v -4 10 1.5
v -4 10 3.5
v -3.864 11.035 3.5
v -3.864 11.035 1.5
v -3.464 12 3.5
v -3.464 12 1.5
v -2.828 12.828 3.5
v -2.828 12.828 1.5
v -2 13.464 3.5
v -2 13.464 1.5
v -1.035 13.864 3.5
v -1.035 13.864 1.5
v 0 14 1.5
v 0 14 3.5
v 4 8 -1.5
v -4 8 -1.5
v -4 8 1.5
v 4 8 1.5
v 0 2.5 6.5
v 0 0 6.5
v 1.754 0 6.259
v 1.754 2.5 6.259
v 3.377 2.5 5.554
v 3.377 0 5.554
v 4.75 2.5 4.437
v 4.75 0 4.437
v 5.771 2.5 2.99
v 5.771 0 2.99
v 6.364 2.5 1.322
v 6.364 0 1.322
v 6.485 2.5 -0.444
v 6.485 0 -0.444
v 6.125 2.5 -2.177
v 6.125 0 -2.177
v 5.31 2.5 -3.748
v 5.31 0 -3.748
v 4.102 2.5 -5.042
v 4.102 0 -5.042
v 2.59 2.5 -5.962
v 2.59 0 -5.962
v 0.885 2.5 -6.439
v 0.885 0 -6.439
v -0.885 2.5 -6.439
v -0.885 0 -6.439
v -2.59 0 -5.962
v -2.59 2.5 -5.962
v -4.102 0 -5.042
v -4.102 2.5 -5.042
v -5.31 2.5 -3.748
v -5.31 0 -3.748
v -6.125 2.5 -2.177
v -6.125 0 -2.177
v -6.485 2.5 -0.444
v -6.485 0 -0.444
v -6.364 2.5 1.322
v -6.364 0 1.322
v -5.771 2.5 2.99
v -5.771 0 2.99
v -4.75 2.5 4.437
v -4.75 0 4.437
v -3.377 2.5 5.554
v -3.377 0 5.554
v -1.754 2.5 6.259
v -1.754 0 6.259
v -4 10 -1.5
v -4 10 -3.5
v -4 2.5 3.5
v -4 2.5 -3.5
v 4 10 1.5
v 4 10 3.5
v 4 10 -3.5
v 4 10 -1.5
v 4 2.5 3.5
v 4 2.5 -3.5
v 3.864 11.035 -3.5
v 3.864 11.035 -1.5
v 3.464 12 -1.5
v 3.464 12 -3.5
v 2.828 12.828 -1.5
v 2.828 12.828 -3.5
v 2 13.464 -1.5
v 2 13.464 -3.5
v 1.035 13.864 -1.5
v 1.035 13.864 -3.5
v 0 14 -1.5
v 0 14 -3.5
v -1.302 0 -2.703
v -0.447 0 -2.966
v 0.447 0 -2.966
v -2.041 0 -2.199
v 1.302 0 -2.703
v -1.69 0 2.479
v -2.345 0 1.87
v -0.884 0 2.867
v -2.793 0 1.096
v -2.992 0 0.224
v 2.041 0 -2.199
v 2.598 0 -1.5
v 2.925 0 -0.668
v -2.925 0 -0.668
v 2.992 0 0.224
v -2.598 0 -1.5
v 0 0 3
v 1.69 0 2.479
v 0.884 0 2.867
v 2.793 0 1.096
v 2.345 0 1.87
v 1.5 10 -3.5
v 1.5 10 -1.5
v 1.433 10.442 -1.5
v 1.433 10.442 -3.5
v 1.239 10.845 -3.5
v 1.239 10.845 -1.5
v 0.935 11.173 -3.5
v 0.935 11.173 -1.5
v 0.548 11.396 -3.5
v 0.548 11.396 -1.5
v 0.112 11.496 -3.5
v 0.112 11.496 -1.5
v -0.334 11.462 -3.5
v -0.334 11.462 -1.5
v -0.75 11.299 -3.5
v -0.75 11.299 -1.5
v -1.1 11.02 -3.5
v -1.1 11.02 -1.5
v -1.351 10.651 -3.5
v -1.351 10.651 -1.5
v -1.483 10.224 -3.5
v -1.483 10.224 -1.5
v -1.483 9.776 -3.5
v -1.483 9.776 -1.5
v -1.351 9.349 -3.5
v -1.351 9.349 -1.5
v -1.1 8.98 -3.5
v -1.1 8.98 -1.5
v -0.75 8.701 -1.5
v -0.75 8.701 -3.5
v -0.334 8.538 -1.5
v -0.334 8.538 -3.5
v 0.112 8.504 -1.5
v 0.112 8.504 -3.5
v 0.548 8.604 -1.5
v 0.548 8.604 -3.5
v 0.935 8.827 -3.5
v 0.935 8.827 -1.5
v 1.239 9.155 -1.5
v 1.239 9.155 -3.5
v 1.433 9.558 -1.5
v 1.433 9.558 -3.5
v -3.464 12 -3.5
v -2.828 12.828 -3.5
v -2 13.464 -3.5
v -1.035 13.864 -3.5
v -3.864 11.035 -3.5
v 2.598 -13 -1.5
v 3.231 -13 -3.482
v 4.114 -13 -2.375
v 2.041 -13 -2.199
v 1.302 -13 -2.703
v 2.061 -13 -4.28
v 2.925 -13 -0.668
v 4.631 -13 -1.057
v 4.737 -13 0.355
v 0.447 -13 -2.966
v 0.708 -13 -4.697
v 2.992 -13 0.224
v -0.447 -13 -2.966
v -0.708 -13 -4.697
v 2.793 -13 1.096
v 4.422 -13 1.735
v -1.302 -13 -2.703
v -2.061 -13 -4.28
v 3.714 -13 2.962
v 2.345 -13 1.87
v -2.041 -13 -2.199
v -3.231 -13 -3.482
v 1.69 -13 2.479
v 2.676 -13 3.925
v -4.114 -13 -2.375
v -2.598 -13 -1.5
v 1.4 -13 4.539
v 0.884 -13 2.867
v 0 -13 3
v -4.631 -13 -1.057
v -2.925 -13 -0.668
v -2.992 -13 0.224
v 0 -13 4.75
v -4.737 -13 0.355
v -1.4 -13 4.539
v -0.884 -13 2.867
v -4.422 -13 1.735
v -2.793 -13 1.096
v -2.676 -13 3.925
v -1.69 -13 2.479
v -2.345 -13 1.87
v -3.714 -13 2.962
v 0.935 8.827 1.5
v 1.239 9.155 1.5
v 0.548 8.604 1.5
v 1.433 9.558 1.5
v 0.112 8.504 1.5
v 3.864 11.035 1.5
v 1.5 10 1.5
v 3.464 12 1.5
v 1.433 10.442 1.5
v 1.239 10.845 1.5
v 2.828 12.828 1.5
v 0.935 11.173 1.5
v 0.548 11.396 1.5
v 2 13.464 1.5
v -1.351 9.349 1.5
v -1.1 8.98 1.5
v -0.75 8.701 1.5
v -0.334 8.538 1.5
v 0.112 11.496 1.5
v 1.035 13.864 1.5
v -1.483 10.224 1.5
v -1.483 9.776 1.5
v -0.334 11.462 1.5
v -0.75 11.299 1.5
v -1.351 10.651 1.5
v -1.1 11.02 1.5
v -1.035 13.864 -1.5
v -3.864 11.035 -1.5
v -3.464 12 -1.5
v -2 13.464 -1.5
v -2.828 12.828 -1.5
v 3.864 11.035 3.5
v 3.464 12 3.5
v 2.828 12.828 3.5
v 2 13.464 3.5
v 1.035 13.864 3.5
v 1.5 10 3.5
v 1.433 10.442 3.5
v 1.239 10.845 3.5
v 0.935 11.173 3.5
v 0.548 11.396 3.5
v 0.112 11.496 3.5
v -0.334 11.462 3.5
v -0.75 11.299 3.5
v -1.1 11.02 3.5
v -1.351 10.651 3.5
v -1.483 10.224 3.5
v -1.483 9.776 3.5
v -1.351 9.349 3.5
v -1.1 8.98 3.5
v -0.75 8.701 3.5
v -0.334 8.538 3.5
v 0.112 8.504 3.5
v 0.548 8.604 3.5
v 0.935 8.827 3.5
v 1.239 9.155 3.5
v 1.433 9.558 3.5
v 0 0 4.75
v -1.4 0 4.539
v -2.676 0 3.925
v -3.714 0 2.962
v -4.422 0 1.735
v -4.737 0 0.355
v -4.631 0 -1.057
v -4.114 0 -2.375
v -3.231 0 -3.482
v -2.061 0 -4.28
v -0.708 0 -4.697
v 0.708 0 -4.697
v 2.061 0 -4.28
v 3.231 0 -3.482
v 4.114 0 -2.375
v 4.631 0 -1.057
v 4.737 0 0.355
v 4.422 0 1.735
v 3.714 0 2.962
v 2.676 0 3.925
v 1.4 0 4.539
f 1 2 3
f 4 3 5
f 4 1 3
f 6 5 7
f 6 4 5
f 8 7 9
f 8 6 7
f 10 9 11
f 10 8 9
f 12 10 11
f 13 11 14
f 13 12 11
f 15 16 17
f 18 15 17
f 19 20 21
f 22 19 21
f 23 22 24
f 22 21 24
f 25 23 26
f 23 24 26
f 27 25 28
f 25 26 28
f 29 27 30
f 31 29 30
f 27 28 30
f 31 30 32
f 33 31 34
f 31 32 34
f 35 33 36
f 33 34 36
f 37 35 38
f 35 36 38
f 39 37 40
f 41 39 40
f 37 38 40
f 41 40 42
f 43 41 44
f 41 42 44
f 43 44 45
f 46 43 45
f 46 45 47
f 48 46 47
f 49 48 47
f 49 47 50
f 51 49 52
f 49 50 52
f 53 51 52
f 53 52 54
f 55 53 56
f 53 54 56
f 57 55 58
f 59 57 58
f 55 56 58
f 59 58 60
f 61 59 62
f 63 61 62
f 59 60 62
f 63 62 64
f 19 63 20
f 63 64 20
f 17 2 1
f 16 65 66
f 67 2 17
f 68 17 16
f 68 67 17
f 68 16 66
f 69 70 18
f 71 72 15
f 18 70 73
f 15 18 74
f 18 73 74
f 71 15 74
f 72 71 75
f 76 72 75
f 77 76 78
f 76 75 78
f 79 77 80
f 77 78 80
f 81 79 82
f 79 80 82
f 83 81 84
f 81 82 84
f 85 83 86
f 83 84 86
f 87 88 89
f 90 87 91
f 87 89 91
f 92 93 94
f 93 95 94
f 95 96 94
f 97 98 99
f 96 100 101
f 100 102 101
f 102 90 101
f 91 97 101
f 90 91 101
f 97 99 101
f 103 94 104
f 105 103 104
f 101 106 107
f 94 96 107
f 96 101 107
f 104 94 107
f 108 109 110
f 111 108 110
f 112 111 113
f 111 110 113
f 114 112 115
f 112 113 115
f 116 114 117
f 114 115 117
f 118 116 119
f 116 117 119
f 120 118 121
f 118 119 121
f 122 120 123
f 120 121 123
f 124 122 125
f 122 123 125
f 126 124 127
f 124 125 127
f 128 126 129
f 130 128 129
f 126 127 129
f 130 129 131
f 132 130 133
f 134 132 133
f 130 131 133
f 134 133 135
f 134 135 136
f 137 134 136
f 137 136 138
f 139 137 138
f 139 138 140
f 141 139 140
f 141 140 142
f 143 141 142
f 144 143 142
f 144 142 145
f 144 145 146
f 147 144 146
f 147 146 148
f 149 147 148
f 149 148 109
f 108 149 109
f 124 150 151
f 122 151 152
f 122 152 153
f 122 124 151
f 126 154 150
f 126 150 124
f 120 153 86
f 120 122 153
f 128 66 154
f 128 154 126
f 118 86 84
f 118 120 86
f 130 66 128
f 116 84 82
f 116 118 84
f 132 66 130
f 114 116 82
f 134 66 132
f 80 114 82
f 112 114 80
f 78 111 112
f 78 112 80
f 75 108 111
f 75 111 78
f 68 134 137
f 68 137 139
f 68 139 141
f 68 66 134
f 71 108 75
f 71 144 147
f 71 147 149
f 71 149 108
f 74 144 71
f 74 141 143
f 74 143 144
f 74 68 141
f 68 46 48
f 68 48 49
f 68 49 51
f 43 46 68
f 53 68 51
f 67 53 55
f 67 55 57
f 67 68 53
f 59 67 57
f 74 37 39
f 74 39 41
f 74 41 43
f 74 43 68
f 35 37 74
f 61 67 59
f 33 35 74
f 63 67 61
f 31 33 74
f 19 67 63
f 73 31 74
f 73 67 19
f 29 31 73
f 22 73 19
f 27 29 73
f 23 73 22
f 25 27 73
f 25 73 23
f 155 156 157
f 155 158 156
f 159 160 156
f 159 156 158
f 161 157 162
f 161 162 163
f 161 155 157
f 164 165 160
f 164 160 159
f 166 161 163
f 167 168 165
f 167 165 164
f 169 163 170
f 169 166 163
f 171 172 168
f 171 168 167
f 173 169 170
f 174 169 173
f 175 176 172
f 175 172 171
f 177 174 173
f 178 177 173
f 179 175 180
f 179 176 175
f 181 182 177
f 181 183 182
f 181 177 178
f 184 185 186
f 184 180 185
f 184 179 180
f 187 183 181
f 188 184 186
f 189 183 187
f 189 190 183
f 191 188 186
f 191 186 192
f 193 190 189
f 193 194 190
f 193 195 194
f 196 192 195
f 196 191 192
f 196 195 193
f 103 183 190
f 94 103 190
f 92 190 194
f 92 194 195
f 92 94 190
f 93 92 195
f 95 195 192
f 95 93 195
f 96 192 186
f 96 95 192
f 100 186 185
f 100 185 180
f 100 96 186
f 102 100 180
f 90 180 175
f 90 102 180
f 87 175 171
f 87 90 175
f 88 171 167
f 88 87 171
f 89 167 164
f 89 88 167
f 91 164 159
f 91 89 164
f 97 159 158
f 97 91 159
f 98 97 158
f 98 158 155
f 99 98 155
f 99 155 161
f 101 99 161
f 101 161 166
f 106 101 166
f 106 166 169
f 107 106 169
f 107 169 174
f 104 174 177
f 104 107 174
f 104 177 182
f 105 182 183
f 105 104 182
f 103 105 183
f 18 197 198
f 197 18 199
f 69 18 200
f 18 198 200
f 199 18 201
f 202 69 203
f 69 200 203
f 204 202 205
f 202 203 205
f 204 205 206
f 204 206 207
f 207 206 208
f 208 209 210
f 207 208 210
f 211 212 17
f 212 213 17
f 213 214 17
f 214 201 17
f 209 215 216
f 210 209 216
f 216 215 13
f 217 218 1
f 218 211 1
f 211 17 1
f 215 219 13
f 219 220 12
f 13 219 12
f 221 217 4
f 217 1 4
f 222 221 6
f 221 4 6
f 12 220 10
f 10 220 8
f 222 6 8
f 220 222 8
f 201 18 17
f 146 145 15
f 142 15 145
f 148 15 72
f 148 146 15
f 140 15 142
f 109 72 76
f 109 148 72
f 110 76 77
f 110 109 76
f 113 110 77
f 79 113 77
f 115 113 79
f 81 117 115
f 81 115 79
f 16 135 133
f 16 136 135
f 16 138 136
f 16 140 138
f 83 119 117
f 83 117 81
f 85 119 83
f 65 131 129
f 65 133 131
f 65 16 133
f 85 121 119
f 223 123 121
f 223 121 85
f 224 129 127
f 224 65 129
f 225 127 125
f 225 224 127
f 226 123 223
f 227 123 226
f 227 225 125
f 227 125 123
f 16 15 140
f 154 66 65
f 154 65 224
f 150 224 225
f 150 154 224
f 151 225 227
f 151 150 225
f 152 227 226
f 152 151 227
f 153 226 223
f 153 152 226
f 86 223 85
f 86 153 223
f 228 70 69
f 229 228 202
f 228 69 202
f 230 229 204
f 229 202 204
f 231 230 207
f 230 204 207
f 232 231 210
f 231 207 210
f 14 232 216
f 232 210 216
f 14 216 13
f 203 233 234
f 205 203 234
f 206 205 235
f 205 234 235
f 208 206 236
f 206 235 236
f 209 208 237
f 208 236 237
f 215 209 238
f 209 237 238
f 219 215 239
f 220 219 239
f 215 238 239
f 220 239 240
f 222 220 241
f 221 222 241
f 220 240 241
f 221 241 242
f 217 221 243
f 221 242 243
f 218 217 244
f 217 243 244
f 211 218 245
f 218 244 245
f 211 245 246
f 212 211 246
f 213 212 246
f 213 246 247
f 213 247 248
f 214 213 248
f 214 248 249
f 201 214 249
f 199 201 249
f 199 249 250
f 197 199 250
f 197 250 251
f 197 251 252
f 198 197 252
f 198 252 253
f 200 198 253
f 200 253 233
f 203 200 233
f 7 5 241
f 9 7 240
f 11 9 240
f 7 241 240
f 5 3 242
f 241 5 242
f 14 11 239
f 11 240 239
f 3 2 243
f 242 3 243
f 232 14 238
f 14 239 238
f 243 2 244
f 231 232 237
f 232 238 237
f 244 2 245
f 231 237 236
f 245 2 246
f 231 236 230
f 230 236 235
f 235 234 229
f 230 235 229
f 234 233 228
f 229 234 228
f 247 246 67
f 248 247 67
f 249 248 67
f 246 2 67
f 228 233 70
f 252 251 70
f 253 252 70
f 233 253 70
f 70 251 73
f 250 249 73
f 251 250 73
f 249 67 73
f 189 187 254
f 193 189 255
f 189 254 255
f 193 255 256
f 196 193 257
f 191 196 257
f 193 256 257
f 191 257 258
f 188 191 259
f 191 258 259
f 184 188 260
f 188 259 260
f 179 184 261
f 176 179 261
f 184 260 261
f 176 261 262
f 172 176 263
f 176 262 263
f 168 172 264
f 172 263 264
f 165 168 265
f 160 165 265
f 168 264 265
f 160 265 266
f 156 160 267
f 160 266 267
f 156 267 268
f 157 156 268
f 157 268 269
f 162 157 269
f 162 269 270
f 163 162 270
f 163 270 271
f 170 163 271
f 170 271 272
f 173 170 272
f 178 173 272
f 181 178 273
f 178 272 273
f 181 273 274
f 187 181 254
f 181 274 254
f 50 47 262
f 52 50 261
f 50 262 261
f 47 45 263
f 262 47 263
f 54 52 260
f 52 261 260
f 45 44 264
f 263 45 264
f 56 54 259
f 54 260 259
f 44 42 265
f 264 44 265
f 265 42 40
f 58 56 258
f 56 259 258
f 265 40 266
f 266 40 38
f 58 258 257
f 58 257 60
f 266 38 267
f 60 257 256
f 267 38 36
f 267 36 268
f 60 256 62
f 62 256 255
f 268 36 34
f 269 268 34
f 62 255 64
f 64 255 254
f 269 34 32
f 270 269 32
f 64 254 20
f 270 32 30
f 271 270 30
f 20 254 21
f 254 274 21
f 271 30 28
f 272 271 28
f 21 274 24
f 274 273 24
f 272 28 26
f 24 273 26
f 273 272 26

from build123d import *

# Parameters (mm, degrees)
SKETCH1_R           = 6.5
BOSS_EXTRUDE1_DEPTH = 2.5
SKETCH2_R           = 4.75
SKETCH2_R_2         = 3
BOSS_EXTRUDE2_DEPTH = 13
SKETCH3_W           = 8
SKETCH3_H           = 7
BOSS_EXTRUDE3_DEPTH = 11.5
FILLET1_R           = 4
SKETCH4_R           = 1.5
CUT_EXTRUDE1_DEPTH  = 13
SKETCH5_W           = 3
SKETCH5_H           = 10.207029109
CUT_EXTRUDE2_DEPTH  = 13


with BuildPart() as part:
    # Sketch1 → Boss-Extrude1 (new body)
    with BuildSketch(Plane(origin=(0, 0, 0), x_dir=(1, 0, 0), z_dir=(0, 1, 0))):
        with Locations(Location((0, 0, 0), (0, 0, 270))):
            Circle(SKETCH1_R)
    extrude(amount=BOSS_EXTRUDE1_DEPTH)

    # Sketch2 → Boss-Extrude2 (add)
    with BuildSketch(Plane.XZ):
        with Locations(Location((0, 0, 0), (0, 0, 90))):
            Circle(SKETCH2_R)
        with Locations(Location((0, 0, 0), (0, 0, 90))):
            Circle(SKETCH2_R_2, mode=Mode.SUBTRACT)
    extrude(amount=BOSS_EXTRUDE2_DEPTH)

    # Sketch3 → Boss-Extrude3 (add)
    with BuildSketch(Plane(origin=(0, 2.5, 0), x_dir=(1, 0, 0), z_dir=(0, 1, 0))):
        Rectangle(SKETCH3_W, SKETCH3_H)
    extrude(amount=BOSS_EXTRUDE3_DEPTH)

    # Fillet1
    fillet1_edges = [part.edges().sort_by_distance(p)[0] for p in [
        (4, 14, 0),
        (-4, 14, 0),
    ]]
    fillet(fillet1_edges, radius=FILLET1_R - 0.0001)  # a hair under: the kernel refuses the full size

    # Sketch4 → Cut-Extrude1 (cut)
    with BuildSketch(Plane.XY.offset(3.5)):
        with Locations((0, 10)):
            Circle(SKETCH4_R)
    extrude(amount=-CUT_EXTRUDE1_DEPTH, mode=Mode.SUBTRACT)

    # Sketch5 → Cut-Extrude2 (cut)
    with BuildSketch(Plane.ZY.offset(4)):
        with Locations((0, 13.103514555)):
            Rectangle(SKETCH5_W, SKETCH5_H)
    extrude(amount=-CUT_EXTRUDE2_DEPTH, mode=Mode.SUBTRACT)


solid = part.part
